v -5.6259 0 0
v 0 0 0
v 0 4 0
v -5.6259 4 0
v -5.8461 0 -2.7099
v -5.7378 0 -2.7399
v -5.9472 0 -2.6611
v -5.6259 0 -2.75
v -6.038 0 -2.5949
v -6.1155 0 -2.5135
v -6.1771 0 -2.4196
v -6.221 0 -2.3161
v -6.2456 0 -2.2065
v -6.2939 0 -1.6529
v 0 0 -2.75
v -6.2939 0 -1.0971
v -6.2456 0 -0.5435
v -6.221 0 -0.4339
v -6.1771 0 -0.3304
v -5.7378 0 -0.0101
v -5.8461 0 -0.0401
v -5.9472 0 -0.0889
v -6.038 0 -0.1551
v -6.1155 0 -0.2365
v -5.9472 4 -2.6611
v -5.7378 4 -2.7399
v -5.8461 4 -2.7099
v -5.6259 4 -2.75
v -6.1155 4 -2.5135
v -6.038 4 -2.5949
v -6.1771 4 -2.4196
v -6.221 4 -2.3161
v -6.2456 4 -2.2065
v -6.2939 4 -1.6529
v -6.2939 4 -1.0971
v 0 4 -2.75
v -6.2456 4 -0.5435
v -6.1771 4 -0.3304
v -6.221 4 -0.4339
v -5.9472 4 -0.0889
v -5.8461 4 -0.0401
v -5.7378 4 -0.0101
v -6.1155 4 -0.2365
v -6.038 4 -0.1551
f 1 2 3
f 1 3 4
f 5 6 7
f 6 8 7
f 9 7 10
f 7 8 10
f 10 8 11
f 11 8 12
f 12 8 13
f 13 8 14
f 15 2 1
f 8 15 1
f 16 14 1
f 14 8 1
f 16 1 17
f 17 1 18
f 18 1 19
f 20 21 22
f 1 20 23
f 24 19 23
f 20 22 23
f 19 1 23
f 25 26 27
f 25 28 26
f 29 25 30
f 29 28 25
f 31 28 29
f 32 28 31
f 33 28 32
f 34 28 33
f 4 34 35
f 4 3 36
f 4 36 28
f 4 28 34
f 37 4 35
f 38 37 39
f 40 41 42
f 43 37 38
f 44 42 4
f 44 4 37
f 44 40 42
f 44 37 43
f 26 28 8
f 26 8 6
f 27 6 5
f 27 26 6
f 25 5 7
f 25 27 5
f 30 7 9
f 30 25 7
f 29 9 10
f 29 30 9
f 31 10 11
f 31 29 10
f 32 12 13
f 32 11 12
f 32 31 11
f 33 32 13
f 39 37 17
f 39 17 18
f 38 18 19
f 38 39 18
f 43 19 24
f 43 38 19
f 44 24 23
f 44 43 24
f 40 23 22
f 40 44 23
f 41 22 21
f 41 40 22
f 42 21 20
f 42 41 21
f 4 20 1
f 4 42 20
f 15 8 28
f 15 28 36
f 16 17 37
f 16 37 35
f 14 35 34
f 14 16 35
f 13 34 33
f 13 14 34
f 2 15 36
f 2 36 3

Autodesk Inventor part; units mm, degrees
ref_plane "YZ Plane" through (0, 0, 0) normal (1, 0, 0) x (0, 1, 0)
ref_plane "XZ Plane" through (0, 0, 0) normal (0, 1, 0) x (-1, 0, 0)
ref_plane "XY Plane" through (0, 0, 0) normal (0, 0, 1) x (1, 0, 0)
sketch "Sketch1" plane through (0, 0, 0) normal (0, 1, 0) x (-1, 0, 0)
  line L0 (0, 0) -> (6.15, 0)
  line L1 (6.15, 0) -> (6.15, -2.75) construction
  line L2 (6.15, -2.75) -> (0, -2.75)
  line L3 (0, -2.75) -> (0, 0)
  arc A0 (6.15, -2.75) -> (6.15, 0) centre (-0.0771, -1.375) ccw
  line L4 (-0.0771, 0) -> (-0.0771, -2.75) construction
  line L5 (6.3, 0.5033) -> (6.3, -3.5493) construction
  dimension "d0" = 2.75
  dimension "d1" = 6.3
  dimension "d2" = 6.15
extrude "Extrusion1" add sketch "Sketch1" along normal blind 4
fillet "Fillet1" radius 0.625 2 edges at (-6.15, 2, -2.75) (-6.15, 2, 0)
properties part number "Button" material "ABS Plastic"
